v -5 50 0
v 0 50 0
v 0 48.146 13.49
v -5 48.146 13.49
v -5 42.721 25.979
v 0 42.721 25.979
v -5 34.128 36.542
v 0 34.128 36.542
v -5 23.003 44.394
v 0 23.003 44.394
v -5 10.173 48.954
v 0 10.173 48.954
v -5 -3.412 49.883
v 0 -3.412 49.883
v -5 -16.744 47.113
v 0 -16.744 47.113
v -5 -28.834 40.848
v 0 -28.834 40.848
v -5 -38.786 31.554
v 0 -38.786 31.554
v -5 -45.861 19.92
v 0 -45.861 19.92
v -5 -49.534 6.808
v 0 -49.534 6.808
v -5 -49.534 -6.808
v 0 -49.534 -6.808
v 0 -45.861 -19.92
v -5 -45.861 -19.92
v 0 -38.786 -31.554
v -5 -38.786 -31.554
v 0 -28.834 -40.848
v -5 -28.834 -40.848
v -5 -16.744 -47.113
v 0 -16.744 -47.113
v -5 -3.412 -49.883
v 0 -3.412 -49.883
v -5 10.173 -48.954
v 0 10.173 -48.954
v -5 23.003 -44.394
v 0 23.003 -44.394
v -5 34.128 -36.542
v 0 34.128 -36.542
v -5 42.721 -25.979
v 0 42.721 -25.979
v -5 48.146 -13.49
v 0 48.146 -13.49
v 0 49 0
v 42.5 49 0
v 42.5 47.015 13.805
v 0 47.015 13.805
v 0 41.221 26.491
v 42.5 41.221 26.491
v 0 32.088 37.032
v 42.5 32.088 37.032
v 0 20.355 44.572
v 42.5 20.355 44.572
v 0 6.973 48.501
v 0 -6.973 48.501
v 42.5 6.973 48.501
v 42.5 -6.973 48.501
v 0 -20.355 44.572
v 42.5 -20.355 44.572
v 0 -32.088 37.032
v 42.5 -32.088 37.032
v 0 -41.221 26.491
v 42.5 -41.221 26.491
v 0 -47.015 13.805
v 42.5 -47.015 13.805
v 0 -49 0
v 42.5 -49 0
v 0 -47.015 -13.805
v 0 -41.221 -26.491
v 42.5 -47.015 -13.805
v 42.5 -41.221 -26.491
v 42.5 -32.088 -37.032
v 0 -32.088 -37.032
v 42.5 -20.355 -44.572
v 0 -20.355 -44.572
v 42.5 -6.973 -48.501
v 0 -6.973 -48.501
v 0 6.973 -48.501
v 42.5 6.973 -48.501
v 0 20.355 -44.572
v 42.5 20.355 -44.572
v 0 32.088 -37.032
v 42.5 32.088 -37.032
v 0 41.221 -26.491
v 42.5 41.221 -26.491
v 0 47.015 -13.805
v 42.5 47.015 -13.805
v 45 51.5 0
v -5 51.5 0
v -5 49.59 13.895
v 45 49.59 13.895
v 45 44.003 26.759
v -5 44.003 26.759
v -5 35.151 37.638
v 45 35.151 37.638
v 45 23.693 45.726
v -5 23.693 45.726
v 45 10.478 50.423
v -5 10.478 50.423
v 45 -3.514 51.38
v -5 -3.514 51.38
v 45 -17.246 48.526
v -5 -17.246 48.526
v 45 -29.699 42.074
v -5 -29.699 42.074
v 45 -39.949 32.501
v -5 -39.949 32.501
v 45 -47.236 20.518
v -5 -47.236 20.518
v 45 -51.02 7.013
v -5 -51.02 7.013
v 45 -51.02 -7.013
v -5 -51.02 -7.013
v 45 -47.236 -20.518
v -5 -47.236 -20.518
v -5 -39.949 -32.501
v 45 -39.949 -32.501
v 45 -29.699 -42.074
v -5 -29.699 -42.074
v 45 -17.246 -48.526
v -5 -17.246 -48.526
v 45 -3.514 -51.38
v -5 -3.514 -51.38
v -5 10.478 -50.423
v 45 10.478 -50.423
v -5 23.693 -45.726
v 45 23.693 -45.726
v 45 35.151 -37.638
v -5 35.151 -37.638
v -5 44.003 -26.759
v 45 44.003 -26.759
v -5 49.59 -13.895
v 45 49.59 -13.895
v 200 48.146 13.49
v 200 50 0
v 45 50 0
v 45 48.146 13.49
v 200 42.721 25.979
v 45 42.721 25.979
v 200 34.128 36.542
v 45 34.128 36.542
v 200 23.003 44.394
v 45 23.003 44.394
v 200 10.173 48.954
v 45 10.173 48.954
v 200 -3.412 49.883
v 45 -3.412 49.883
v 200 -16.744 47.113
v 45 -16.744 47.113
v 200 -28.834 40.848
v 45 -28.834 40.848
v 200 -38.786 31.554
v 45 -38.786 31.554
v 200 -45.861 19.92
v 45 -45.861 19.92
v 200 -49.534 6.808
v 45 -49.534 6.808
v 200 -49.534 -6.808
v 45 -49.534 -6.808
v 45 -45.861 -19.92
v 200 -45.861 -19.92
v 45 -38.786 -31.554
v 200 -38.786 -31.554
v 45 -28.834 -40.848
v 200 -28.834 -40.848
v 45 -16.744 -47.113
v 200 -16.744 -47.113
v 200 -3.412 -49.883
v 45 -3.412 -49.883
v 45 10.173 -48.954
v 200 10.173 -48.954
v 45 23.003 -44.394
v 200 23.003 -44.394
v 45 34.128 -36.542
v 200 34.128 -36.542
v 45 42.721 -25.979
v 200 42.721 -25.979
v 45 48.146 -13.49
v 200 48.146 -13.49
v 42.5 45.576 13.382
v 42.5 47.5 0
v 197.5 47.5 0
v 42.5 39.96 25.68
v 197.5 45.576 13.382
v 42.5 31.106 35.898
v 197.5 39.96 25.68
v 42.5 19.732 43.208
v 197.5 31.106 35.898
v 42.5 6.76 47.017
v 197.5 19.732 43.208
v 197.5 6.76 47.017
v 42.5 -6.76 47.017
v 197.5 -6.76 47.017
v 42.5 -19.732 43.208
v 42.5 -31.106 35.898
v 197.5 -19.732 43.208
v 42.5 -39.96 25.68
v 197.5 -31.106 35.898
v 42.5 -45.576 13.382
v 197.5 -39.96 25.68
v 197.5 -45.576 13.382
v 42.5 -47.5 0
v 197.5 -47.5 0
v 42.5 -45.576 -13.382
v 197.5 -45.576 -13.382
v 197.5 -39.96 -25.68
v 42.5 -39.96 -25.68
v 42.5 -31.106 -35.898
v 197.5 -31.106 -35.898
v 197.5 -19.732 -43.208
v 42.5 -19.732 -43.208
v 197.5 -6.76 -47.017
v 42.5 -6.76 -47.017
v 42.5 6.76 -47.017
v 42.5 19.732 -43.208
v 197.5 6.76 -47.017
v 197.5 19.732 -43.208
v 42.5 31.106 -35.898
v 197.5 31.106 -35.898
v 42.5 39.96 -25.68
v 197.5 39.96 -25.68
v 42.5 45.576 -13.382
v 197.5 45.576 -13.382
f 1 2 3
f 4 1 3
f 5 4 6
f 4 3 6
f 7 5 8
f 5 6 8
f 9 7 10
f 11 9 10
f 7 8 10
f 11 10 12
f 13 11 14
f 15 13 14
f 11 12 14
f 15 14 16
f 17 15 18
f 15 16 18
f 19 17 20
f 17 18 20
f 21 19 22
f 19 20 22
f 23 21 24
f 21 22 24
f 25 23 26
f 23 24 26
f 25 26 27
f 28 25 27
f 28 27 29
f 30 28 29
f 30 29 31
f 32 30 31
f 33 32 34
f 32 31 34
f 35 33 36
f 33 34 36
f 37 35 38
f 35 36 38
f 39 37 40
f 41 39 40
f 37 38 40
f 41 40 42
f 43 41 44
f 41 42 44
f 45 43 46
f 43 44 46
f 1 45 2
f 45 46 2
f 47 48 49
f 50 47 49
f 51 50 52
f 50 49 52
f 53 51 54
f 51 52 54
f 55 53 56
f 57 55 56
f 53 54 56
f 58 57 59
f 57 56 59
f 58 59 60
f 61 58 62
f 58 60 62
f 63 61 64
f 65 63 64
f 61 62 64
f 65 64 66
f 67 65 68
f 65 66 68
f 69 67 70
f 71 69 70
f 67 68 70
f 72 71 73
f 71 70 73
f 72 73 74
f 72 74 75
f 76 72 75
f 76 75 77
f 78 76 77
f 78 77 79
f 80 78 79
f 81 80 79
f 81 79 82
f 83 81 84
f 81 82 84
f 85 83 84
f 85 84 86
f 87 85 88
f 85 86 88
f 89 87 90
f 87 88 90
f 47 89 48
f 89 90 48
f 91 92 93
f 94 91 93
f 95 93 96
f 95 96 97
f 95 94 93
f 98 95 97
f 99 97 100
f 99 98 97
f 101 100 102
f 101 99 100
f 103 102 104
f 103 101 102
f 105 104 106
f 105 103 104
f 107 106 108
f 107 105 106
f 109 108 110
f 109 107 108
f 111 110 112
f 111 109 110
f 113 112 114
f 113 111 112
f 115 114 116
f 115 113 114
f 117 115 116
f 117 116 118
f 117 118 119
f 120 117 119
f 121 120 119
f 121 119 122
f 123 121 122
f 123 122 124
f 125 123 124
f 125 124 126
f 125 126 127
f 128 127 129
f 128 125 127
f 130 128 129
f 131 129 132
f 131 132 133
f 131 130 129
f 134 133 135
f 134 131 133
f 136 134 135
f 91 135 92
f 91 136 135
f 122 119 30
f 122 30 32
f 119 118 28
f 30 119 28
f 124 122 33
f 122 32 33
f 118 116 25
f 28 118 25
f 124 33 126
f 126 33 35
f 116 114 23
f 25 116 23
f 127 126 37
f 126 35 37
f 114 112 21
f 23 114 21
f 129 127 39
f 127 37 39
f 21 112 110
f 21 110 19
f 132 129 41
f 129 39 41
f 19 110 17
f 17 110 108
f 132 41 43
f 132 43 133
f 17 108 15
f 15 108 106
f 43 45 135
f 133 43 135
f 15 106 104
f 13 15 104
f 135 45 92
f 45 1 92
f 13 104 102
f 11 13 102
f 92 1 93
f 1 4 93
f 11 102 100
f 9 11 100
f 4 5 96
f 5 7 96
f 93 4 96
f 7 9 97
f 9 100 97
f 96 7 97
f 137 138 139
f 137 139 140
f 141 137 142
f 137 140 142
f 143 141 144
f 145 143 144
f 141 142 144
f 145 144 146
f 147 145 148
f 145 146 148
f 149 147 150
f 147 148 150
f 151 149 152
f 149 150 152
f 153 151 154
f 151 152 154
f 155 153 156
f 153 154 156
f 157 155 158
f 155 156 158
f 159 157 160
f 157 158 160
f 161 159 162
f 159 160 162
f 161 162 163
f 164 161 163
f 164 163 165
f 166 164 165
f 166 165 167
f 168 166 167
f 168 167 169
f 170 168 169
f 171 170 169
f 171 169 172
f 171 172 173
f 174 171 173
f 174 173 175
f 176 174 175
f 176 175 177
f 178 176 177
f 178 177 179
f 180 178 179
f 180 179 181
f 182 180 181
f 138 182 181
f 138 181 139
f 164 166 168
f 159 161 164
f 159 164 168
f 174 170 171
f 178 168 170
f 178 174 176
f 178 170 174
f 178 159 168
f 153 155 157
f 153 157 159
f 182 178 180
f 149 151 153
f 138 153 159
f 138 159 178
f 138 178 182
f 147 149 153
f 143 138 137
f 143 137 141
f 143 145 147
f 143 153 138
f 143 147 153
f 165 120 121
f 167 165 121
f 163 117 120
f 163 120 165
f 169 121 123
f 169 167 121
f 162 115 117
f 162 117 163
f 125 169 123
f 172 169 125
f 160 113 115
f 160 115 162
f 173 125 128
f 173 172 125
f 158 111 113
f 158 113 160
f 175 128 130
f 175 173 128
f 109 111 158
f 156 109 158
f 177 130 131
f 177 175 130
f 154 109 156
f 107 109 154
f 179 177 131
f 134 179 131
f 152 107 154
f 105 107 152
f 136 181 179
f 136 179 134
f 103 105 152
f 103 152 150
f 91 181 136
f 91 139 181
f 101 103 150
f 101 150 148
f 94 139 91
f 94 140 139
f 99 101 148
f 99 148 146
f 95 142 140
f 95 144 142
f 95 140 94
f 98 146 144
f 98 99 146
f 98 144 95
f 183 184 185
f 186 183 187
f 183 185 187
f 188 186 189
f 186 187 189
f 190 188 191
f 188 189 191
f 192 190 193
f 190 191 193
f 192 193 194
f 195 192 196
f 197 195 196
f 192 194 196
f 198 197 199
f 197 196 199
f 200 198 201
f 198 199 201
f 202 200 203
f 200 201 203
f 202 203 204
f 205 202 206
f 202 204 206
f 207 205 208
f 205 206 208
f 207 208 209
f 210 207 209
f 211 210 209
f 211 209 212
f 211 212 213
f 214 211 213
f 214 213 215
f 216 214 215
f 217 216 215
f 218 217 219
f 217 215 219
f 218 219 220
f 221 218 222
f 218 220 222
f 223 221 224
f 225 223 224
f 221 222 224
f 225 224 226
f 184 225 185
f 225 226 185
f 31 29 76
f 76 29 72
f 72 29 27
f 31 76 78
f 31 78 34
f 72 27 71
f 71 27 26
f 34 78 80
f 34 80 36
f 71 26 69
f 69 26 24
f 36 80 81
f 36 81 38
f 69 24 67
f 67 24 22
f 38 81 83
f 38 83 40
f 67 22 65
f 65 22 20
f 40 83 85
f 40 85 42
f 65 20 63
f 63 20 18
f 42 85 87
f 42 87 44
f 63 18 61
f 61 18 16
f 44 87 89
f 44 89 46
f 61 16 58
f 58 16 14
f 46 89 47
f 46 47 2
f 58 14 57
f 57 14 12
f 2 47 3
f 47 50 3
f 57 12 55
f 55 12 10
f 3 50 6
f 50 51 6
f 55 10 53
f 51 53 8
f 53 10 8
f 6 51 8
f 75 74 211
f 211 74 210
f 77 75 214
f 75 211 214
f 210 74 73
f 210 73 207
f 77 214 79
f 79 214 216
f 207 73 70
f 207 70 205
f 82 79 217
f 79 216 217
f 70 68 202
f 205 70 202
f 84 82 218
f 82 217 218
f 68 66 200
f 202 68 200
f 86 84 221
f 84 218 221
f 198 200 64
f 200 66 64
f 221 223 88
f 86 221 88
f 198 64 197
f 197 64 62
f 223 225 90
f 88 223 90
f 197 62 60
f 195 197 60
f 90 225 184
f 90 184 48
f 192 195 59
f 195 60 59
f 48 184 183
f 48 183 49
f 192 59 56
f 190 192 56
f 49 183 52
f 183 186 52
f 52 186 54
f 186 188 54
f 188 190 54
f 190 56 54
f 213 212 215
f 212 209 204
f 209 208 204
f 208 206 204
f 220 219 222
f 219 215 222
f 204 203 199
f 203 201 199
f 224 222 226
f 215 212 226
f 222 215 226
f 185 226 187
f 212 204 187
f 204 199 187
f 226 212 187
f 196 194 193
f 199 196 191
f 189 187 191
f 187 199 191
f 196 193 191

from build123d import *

# Parameters (mm, degrees)
F0_R     = 51.5
F0_R_2   = 50
F1_DEPTH = 45
F2_DEPTH = 200
F3_DEPTH = 5
F4_T     = 2.5


# Not quite as in the source:
# - a shell that OpenCascade refuses in one call is made with other operations: the cavity is built on its own and cut out


with BuildPart() as f1:
    # F0 (on Right) → F1 (new body)
    with BuildSketch(Plane.YZ):
        Circle(F0_R)
        Circle(F0_R_2, mode=Mode.SUBTRACT)
    extrude(amount=F1_DEPTH)

    # F0 (on Right) → F2 (join)
    with BuildSketch(Plane.YZ):
        Circle(F0_R_2)
    extrude(amount=F2_DEPTH)

    # F0 (on Right) → F3 (join)
    with BuildSketch(Plane.YZ):
        Circle(F0_R)
        Circle(F0_R_2, mode=Mode.SUBTRACT)
    extrude(amount=-F3_DEPTH)

    # F4: shell of thickness 2.5, made by hand


with BuildPart() as f4_core1:
    # F4_t2: copy of F1
    add(f1.part)

    # the walls: a layer under each face that stays
    f4_faces = [f4_core1.faces().sort_by_distance(p)[0] for p in [
        (22.5, -51.5, 0),
        (-2.5, -51.5, 0),
        (45, 45.0625, -24.7962962963),
        (-5, 45.0625, -24.7962962963),
        (122.5, -50, 0),
        (-2.5, -50, 0),
        (200, 0, 0),
    ]]
    thicken(f4_faces, amount=-F4_T, mode=Mode.SUBTRACT)

    # F4_s3 → F4_t4 (revolve, cut)
    with BuildSketch(Plane.XY):
        Polygon((45.025, 50.025), (42.5, 50), (42.5, 47.5), (45, 47.5), align=None)
    revolve(axis=Axis((45, 0, 0), (1, 0, 0)), mode=Mode.SUBTRACT)


with BuildPart() as f1_1:
    add(f1.part)

    # what is left inside the walls is the cavity
    f4_cavity = [f4_core1.part.solids().sort_by_distance(p)[0] for p in [
        (146.666667, -47.475, 0),
    ]]
    add(f4_cavity, mode=Mode.SUBTRACT)


solid = f1_1.part
